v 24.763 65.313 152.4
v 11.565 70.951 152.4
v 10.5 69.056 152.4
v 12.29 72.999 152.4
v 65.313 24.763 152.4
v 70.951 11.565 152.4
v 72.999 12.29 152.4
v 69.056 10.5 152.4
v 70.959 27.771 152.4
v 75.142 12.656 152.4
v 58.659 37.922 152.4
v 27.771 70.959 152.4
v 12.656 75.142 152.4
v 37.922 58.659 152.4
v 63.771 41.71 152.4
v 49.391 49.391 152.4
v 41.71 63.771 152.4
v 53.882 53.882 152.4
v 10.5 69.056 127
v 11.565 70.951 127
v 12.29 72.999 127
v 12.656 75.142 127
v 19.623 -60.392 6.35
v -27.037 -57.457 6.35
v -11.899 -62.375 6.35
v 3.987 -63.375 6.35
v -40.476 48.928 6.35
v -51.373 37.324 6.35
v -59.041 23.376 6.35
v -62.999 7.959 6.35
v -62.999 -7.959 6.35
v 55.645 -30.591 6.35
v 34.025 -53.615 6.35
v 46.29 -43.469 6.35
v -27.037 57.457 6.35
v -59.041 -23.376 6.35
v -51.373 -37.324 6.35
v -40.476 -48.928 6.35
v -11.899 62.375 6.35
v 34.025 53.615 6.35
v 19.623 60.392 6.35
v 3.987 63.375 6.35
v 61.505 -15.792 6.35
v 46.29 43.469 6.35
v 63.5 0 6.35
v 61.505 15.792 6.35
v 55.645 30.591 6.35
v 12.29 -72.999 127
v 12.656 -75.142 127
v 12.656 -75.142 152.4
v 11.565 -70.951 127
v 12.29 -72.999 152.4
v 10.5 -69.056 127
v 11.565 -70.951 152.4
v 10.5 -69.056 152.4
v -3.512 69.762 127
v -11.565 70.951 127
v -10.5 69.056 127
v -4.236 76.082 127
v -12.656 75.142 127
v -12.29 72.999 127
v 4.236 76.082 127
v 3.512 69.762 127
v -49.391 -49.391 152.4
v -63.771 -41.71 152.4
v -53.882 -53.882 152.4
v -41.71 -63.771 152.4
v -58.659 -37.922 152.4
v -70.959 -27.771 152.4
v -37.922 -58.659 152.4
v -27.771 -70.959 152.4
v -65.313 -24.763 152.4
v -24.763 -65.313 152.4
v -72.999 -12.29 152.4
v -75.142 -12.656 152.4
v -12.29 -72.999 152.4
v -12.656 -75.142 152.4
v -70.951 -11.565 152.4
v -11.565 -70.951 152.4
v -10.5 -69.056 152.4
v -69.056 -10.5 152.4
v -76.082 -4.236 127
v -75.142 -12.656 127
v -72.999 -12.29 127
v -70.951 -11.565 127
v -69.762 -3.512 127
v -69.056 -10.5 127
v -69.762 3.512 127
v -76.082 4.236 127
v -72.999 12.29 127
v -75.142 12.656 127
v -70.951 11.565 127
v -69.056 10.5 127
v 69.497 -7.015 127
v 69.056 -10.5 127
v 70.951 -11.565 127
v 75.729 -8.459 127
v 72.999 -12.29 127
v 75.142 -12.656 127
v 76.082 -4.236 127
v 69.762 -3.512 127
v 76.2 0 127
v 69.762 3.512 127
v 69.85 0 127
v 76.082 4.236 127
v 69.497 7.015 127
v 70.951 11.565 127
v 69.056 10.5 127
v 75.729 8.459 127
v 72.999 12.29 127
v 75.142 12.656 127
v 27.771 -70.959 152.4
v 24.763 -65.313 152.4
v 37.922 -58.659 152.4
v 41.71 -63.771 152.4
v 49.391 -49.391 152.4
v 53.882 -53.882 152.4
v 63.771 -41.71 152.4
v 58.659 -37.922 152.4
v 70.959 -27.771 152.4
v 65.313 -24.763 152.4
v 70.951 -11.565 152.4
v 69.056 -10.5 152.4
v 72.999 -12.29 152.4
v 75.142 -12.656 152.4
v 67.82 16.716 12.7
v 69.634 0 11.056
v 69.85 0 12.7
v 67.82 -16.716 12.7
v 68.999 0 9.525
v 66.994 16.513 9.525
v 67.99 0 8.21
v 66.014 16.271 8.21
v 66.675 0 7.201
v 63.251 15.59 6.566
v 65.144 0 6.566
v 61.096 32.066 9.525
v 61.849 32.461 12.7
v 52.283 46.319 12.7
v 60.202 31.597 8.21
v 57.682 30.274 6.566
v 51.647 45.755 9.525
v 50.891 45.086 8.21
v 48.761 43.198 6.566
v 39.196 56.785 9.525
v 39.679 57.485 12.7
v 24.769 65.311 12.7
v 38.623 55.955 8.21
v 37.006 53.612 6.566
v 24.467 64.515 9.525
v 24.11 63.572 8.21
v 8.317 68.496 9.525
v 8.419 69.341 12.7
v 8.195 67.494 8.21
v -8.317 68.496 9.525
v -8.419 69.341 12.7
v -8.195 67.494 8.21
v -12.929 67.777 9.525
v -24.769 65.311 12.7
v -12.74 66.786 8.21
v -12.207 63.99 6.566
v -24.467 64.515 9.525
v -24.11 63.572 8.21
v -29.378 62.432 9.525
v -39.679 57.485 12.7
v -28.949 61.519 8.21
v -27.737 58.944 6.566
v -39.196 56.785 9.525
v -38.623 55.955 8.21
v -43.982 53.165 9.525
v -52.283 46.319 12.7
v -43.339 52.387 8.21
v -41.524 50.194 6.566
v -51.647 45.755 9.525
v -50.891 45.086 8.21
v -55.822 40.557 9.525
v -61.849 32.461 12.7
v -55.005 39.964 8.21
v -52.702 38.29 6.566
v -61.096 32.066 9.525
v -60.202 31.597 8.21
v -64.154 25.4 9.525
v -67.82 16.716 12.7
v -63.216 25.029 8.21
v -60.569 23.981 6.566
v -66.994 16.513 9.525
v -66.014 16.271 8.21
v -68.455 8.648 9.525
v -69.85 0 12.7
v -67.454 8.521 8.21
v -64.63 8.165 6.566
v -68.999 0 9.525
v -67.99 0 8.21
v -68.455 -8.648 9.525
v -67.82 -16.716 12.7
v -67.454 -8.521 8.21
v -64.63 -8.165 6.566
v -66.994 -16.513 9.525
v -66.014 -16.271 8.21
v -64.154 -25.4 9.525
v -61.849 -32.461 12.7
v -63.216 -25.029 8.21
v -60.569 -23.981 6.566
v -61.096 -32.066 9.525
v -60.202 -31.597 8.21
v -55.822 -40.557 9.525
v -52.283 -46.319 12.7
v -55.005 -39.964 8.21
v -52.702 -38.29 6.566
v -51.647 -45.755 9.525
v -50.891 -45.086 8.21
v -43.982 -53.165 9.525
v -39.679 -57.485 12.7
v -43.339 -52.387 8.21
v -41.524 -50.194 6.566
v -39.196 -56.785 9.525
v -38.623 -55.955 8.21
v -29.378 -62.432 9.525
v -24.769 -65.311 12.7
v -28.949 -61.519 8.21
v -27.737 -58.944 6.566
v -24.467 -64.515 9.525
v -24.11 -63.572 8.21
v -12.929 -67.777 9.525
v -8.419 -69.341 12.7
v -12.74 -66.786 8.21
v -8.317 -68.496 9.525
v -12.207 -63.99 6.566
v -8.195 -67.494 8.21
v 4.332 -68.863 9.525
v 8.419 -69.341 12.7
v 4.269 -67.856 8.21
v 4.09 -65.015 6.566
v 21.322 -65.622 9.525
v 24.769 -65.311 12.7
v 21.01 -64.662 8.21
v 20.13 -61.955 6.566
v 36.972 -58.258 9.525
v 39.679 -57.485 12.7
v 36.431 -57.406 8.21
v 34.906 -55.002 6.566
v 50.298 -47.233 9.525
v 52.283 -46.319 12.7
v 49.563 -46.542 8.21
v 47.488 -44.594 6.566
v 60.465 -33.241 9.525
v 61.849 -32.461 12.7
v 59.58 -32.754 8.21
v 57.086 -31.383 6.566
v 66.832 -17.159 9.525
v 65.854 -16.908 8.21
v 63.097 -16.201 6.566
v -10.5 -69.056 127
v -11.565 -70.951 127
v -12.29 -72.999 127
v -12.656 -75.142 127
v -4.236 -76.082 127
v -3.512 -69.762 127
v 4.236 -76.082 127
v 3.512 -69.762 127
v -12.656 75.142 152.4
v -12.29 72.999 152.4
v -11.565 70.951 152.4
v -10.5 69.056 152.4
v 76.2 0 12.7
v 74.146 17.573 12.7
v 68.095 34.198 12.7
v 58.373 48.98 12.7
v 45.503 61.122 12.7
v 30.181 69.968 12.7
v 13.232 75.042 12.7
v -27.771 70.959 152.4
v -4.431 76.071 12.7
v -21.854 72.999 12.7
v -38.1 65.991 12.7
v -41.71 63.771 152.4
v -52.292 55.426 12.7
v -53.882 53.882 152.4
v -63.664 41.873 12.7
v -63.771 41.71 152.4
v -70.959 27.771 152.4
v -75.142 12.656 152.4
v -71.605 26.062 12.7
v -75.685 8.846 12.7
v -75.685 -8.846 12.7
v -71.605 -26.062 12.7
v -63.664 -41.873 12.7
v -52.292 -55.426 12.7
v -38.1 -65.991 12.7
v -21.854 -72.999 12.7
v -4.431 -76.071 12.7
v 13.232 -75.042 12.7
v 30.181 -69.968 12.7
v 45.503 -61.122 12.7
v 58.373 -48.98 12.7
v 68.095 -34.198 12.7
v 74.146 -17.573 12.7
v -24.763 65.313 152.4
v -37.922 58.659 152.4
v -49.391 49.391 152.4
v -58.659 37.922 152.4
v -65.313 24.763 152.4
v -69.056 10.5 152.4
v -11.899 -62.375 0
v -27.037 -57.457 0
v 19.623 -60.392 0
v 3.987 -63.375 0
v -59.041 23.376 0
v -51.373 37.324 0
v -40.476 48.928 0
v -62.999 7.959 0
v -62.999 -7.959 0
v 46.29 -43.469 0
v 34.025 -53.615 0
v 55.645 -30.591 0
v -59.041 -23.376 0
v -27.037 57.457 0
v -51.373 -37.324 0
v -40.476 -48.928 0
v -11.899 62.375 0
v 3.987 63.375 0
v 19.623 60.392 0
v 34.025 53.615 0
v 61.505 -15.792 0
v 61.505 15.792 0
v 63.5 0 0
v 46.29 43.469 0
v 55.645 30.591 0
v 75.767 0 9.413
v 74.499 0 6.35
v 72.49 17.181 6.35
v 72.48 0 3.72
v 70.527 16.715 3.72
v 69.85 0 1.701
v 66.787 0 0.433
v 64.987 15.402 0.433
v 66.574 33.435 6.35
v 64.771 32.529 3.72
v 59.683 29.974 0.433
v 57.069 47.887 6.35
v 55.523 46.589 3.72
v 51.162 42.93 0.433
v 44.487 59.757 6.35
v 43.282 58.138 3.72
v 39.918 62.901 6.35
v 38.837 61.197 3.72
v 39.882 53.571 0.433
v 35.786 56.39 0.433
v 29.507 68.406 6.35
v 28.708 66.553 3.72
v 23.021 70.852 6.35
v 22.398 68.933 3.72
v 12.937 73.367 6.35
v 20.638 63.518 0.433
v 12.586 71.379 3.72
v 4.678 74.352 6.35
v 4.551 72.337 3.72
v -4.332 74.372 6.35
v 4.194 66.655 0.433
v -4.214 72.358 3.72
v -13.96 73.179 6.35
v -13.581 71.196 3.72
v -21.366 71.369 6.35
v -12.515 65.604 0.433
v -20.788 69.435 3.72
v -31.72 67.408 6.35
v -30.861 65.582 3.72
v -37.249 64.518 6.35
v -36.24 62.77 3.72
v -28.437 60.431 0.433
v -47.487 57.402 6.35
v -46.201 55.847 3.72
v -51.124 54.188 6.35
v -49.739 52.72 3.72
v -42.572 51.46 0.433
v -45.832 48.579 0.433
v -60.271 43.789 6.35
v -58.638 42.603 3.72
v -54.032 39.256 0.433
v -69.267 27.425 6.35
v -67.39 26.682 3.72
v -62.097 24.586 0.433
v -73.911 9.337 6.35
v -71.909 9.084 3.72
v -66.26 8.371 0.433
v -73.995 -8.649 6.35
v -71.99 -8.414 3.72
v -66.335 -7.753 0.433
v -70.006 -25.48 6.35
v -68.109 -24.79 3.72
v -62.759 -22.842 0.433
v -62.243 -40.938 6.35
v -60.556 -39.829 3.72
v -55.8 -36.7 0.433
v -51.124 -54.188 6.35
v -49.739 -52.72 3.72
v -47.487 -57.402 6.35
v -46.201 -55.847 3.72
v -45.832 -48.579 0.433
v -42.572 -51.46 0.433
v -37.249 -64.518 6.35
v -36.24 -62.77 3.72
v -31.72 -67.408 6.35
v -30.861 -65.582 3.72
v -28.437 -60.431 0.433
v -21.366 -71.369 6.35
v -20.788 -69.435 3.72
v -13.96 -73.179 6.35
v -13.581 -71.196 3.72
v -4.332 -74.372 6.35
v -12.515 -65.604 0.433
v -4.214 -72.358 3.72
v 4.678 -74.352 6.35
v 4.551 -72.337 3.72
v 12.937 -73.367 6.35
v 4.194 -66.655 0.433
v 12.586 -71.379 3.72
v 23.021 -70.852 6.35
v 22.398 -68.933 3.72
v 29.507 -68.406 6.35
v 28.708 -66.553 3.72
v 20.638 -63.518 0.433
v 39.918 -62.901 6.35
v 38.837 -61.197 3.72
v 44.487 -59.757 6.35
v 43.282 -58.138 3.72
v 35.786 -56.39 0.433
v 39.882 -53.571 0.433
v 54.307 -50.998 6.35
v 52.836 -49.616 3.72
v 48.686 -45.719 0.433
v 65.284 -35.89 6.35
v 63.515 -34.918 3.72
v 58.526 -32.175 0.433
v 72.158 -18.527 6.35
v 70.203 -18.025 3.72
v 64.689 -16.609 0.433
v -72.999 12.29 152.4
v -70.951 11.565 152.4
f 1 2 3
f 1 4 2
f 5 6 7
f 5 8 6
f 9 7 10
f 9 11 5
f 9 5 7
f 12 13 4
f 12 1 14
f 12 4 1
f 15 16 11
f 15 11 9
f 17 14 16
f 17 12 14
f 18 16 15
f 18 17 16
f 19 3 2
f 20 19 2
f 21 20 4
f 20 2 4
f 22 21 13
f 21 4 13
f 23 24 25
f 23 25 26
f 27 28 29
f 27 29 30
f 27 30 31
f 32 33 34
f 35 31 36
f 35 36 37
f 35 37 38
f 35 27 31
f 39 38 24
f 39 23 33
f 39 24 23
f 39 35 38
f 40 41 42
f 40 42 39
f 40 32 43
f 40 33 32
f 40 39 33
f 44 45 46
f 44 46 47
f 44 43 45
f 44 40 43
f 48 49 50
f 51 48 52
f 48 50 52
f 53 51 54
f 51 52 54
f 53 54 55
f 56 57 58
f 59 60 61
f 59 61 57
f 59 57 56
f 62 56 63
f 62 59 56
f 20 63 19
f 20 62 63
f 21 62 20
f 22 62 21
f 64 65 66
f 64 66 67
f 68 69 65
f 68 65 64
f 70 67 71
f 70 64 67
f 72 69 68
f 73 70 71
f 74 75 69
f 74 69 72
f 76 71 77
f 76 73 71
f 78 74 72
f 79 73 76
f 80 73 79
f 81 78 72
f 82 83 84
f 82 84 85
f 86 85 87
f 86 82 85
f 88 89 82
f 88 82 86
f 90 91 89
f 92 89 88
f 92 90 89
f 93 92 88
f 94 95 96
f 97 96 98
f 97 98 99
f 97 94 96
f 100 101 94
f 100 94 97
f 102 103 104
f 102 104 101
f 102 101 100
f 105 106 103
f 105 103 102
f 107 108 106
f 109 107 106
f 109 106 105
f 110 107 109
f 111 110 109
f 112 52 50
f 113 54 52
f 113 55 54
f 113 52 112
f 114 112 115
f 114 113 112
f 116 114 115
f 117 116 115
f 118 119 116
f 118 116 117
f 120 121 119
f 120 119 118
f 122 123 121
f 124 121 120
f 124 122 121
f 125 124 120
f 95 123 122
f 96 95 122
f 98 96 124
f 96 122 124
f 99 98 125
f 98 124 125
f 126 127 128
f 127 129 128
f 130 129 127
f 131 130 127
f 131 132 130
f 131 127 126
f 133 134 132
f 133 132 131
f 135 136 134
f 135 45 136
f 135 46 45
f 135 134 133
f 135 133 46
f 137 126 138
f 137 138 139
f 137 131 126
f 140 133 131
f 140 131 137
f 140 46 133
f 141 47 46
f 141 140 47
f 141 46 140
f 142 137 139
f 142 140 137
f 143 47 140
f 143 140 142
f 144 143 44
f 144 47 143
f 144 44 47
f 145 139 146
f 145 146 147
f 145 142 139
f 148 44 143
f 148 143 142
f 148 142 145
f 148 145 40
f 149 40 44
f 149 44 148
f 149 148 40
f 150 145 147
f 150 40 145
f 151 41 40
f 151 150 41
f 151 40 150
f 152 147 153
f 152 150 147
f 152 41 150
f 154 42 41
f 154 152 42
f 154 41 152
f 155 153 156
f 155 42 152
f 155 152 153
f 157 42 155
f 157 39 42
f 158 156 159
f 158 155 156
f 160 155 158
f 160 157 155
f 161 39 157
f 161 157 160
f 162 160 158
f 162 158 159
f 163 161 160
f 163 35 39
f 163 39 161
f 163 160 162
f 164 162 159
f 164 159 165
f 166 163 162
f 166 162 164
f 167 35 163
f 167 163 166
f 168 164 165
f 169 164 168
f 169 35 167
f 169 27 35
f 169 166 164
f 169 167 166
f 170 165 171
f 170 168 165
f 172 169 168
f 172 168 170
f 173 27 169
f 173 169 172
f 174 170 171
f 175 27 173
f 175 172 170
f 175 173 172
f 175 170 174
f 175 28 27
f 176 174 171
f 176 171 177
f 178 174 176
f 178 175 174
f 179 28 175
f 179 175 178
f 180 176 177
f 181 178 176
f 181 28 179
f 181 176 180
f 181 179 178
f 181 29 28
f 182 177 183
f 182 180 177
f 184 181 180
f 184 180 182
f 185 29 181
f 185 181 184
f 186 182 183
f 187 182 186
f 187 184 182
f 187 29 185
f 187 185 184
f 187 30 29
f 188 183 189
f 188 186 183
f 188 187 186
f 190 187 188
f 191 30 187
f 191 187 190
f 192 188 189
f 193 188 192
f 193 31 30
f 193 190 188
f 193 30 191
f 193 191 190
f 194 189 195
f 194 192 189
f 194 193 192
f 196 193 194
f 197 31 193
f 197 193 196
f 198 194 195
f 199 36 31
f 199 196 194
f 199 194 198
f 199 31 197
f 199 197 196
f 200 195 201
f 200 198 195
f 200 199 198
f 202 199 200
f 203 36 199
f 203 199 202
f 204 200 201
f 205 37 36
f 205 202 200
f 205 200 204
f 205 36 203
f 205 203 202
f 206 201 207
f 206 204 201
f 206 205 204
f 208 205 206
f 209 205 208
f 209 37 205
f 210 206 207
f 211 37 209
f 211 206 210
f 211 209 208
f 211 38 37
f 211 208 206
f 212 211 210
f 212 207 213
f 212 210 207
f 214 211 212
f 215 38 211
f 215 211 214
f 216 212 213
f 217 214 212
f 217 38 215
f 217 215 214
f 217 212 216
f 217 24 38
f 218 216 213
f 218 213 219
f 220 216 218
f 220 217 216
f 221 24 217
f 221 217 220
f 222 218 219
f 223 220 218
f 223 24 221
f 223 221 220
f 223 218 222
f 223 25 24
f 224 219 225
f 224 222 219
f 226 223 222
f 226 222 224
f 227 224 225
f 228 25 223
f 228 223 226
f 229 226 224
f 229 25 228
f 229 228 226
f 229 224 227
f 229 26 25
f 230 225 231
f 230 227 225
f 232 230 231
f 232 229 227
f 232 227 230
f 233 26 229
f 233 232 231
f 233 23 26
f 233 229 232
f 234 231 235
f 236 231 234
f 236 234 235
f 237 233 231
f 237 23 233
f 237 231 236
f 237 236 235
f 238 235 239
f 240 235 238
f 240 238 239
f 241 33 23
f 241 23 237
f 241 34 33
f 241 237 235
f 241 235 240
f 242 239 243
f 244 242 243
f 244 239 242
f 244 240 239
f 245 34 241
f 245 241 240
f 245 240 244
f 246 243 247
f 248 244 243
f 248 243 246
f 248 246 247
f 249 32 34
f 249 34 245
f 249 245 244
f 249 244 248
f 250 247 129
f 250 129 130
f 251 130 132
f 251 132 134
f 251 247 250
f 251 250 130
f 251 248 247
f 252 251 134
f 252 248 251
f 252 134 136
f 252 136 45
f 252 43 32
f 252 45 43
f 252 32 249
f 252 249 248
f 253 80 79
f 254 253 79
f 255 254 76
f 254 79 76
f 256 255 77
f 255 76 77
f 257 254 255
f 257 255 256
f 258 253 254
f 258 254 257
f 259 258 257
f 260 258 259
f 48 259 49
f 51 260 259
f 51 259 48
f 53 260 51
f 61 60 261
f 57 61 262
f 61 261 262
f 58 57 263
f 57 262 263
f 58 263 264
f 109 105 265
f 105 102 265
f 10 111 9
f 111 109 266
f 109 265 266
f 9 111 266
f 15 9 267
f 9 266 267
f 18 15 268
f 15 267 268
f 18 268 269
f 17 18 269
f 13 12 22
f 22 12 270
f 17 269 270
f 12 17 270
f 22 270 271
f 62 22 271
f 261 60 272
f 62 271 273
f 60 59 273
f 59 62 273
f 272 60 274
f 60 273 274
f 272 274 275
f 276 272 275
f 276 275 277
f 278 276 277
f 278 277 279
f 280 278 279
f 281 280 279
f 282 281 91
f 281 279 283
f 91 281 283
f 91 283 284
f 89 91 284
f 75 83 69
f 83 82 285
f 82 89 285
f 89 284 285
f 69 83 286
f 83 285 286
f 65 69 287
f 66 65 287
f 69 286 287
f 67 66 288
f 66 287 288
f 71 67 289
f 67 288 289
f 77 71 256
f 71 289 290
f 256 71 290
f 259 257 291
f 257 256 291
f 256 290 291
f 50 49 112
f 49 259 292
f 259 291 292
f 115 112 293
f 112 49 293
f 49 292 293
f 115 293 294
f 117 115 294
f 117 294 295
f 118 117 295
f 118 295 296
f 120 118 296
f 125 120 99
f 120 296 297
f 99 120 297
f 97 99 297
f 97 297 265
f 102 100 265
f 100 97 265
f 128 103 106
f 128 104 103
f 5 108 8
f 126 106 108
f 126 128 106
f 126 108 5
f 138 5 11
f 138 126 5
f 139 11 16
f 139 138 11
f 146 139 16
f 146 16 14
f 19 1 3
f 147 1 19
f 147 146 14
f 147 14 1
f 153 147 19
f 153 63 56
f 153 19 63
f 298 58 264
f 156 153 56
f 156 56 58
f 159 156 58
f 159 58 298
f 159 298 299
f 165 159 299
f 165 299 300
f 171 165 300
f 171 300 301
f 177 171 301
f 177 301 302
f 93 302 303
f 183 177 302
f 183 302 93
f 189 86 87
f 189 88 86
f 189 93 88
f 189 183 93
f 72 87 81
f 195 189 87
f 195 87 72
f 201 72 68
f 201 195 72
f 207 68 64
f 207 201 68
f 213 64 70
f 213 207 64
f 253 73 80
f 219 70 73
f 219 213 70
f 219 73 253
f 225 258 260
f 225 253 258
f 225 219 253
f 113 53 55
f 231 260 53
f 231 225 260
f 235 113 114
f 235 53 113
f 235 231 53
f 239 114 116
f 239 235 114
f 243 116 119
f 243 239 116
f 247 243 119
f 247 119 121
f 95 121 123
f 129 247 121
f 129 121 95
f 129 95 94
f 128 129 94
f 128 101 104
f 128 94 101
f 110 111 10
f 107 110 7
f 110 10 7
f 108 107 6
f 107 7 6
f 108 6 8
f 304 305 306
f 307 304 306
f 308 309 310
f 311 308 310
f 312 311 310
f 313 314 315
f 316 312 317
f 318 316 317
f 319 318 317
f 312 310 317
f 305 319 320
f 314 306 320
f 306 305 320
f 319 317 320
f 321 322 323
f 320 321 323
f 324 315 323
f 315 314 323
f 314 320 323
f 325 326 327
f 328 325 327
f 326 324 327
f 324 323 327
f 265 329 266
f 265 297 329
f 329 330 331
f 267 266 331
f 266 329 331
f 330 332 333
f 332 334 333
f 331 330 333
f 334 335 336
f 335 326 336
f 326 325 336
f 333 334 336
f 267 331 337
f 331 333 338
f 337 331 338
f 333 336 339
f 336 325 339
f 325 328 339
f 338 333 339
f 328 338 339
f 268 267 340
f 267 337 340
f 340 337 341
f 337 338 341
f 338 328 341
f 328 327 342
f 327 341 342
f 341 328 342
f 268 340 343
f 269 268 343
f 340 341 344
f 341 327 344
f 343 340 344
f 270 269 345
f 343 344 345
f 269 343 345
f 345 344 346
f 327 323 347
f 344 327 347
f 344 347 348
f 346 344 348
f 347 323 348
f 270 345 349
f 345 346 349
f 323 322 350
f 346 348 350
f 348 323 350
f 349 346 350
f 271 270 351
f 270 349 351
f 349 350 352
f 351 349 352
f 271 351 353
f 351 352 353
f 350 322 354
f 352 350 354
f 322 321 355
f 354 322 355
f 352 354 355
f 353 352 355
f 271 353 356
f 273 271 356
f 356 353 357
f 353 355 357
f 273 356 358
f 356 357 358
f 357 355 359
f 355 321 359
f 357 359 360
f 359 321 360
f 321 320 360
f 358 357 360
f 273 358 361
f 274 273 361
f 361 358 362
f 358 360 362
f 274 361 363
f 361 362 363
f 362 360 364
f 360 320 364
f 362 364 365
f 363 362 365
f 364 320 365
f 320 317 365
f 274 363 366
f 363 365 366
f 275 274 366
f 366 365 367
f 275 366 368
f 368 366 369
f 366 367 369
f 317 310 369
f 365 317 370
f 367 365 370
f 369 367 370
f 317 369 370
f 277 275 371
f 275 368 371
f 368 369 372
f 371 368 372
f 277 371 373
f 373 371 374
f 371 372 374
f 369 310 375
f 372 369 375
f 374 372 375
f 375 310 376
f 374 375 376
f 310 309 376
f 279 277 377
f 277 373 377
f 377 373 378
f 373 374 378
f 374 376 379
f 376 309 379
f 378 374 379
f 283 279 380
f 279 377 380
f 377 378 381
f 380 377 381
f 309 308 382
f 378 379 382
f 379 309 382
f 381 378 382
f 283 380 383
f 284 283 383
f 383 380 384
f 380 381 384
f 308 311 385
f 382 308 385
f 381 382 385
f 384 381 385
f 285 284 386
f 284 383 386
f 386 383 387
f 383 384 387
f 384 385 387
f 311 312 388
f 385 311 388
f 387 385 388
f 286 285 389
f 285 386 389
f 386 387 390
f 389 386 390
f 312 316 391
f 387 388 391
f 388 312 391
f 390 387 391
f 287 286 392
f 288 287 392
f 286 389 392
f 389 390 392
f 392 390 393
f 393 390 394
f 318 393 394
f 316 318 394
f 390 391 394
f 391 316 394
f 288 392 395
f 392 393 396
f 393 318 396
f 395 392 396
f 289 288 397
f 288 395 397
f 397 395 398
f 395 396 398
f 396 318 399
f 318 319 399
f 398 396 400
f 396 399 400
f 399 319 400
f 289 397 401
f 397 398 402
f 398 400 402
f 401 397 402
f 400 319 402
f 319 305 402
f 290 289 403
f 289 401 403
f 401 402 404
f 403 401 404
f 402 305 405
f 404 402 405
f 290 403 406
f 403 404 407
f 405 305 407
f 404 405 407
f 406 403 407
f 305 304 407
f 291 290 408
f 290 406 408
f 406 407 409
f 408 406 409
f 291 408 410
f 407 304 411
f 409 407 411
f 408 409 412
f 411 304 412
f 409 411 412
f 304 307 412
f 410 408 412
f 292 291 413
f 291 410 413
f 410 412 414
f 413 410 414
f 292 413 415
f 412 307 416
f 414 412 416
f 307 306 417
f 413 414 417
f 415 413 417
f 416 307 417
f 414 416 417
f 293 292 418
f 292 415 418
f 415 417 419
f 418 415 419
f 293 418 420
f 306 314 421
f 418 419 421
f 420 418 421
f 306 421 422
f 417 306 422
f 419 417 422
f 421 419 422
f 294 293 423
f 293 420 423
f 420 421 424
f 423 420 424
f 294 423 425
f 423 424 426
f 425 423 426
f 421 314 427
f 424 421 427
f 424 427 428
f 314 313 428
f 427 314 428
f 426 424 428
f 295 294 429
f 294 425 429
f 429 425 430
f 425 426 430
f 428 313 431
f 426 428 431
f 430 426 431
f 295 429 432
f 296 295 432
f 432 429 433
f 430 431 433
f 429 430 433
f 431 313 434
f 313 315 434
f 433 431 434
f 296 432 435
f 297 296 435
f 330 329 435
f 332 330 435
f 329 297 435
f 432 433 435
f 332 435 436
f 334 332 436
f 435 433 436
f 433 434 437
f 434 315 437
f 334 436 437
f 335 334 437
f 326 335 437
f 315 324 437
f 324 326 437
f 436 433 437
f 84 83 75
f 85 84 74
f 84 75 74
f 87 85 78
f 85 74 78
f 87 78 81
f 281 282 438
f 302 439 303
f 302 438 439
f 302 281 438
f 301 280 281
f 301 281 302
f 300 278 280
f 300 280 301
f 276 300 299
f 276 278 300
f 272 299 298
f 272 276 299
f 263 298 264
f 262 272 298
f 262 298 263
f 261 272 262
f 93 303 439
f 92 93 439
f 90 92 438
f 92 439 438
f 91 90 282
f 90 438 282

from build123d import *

# Parameters (mm, degrees)
F0_R     = 76.2
F1_DEPTH = 152.4
F2_R     = 12.7
F3_T     = -6.35
F4_R     = 12.7
F5_DEPTH = 25.4


with BuildPart() as f1:
    # F0 (on Top) → F1 (new body)
    with BuildSketch(Plane.XY):
        Circle(F0_R)
    extrude(amount=F1_DEPTH)

    # F2
    f2_edges = [f1.edges().sort_by_distance(p)[0] for p in [
        (-76.2, 0, 0),
    ]]
    fillet(f2_edges, radius=F2_R)

    # F3
    f3_openings = [f1.faces().sort_by_distance(p)[0] for p in [
        (0, 0, 152.4),
    ]]
    offset(amount=F3_T, openings=f3_openings)

    # F4 (on face) → F5 (cut)
    with BuildSketch(Plane.XY.offset(152.4)):
        with Locations((0, 76.2)):
            Circle(F4_R)
        with Locations((-76.2, 0)):
            Circle(F4_R)
        with Locations((0, -76.2)):
            Circle(F4_R)
        with Locations((76.2, 0)):
            Circle(F4_R)
    extrude(amount=-F5_DEPTH, mode=Mode.SUBTRACT)


solid = f1.part
